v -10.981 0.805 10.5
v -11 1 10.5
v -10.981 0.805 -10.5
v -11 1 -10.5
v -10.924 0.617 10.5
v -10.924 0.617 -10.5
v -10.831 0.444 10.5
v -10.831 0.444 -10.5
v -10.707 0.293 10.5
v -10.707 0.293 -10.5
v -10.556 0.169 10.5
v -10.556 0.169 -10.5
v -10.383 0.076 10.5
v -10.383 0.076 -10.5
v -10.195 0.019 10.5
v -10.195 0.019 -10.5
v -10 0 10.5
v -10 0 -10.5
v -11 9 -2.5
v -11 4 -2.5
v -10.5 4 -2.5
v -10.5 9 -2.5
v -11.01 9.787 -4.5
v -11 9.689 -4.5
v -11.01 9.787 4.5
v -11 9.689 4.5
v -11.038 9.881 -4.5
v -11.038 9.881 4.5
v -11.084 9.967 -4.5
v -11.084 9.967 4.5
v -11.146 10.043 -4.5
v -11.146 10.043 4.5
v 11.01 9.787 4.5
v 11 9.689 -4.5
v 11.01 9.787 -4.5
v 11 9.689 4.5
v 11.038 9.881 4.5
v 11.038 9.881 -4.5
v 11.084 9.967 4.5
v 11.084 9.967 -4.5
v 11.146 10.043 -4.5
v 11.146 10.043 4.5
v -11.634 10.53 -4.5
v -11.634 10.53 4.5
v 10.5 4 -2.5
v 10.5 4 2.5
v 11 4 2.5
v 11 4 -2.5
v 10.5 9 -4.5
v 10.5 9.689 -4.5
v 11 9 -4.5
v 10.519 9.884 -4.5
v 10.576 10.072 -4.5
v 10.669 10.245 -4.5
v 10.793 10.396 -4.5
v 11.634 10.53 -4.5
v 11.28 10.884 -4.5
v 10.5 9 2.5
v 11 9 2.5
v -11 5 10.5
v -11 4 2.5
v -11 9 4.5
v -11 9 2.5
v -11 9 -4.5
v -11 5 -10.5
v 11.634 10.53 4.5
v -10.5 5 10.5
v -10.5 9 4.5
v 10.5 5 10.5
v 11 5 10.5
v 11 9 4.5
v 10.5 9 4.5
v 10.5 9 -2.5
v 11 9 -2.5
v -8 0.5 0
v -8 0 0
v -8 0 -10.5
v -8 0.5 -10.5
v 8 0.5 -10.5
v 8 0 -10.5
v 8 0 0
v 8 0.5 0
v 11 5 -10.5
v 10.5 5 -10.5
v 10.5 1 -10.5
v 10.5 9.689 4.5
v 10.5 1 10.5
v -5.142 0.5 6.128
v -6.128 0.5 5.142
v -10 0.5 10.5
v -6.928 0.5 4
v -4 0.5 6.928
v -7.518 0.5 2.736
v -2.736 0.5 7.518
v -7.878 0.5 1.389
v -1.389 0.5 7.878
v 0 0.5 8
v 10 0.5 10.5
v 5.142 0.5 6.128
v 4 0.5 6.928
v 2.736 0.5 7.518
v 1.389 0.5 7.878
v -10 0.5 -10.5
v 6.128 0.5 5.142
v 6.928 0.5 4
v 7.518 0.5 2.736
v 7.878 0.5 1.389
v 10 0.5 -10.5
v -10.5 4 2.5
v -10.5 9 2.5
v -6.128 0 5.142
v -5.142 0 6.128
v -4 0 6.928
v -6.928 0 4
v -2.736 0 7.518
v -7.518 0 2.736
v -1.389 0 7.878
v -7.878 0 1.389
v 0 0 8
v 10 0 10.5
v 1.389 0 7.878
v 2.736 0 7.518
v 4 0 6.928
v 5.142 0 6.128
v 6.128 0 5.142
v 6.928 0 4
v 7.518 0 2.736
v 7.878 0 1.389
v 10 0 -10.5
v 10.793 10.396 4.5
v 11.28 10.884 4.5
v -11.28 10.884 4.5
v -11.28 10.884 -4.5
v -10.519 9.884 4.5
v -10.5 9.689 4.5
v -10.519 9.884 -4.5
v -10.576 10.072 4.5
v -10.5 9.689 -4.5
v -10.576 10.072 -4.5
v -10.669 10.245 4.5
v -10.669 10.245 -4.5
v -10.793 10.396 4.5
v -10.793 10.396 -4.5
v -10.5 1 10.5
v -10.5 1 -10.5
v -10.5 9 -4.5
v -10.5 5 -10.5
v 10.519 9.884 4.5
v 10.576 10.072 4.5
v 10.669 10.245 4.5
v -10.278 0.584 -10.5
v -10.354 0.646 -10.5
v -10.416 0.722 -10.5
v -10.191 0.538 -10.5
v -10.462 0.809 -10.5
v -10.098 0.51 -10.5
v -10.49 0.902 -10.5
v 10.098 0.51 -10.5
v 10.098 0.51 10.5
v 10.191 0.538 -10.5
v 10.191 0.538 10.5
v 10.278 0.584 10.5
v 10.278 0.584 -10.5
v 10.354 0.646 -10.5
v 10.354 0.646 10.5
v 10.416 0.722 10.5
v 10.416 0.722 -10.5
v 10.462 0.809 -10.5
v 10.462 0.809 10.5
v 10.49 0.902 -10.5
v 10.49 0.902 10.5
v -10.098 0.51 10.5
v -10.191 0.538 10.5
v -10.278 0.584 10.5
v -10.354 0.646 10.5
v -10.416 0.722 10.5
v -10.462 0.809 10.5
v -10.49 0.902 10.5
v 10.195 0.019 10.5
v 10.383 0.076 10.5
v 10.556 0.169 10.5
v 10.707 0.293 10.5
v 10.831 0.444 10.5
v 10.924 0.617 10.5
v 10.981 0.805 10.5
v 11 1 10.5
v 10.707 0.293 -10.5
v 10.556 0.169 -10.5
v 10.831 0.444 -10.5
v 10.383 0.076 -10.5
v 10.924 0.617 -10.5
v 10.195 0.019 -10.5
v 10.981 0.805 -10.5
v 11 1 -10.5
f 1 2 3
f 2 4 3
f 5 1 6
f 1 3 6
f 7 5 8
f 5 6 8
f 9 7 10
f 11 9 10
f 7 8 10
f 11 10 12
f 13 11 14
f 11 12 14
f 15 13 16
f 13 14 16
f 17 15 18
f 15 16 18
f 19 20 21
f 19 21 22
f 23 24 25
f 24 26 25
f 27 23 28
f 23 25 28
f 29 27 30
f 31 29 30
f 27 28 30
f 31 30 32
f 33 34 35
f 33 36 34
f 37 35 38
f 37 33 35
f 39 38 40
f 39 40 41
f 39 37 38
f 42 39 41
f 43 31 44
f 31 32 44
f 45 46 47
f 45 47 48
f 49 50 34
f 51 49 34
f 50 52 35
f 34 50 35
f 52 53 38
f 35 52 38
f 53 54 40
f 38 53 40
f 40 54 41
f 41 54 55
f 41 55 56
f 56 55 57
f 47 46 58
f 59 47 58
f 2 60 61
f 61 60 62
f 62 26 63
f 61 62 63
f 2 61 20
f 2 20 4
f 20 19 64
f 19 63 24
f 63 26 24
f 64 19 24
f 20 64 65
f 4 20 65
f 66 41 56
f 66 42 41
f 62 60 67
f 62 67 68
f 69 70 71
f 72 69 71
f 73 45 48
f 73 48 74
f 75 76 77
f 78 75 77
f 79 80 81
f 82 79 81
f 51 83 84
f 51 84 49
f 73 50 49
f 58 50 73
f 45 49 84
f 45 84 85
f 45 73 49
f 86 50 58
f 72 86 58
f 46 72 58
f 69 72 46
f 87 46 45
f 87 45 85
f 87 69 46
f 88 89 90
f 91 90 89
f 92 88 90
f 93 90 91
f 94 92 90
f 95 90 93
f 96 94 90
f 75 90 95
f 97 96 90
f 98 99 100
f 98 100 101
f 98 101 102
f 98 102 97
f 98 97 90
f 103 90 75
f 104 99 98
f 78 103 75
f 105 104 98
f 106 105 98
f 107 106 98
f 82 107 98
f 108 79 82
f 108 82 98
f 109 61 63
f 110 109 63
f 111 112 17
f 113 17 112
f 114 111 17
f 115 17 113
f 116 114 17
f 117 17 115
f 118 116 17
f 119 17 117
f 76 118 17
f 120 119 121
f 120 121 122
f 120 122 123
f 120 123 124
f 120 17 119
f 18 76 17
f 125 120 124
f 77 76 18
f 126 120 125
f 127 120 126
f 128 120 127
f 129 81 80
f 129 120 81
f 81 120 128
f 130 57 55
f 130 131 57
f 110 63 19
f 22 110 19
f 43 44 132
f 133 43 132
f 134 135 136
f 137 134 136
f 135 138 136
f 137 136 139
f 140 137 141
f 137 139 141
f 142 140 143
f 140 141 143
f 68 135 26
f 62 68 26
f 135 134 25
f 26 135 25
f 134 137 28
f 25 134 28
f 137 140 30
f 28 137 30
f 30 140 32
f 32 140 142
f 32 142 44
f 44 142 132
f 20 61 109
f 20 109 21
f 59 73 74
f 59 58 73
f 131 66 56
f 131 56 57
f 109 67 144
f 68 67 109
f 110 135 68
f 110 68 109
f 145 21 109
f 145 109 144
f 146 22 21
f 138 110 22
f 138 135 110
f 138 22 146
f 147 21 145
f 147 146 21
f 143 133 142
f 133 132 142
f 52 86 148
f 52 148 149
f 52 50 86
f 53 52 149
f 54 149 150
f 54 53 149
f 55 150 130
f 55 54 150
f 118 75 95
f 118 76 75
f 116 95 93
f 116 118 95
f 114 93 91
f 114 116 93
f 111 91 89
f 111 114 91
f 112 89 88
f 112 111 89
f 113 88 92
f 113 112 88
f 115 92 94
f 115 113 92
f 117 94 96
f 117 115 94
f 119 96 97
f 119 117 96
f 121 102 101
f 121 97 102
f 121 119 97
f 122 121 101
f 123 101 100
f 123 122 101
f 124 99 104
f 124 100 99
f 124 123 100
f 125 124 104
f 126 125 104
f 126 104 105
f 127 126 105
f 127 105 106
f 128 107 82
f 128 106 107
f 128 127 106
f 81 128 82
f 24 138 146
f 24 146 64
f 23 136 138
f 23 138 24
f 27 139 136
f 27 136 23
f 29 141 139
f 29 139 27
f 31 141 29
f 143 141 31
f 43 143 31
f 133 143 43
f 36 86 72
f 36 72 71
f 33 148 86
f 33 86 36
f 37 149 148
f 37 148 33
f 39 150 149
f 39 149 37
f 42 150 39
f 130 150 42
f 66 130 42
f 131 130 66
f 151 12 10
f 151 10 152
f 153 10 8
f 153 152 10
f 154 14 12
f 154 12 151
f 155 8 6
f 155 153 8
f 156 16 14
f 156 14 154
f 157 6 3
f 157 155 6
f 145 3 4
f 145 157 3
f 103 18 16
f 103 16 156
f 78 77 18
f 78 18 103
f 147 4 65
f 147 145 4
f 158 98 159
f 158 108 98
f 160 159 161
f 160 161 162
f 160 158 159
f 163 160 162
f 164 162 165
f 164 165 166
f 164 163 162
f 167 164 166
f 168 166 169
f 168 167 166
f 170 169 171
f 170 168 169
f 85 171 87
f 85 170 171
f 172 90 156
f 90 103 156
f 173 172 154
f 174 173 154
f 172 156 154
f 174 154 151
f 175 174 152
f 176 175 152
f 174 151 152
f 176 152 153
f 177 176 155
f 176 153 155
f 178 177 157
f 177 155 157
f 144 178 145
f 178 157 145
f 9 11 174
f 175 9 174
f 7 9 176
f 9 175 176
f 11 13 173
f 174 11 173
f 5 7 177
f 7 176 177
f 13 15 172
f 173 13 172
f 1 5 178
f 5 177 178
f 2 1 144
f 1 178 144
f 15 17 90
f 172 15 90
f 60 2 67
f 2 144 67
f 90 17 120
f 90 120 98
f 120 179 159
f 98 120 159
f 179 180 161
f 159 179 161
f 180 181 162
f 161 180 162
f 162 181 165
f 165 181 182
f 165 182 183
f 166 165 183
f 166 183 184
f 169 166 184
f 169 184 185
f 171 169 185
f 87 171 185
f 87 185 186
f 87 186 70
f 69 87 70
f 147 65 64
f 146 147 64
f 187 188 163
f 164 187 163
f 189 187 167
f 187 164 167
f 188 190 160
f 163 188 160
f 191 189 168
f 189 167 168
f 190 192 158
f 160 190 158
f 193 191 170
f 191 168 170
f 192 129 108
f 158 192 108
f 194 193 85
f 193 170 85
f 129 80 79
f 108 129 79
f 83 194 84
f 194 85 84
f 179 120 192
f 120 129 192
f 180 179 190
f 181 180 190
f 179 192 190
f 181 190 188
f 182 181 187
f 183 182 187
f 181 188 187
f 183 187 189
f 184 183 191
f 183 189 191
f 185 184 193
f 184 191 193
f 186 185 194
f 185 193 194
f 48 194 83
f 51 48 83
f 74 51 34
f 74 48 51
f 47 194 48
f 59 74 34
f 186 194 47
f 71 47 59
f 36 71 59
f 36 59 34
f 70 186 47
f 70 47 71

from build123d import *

# Parameters (mm, degrees)
SKETCH2_W               = 21
SKETCH2_H               = 21
SKETCH2_R               = 8
BOSS_EXTRUDE1_DEPTH     = 0.5
CUT_EXTRUDE1_START      = -1.5
CUT_EXTRUDE1_DEPTH      = 1.5
SKETCH4_W               = 21
SKETCH4_H               = 9
BOSS_EXTRUDE2_DEPTH     = 0.5
CUT_EXTRUDE2_DEPTH      = 26.563646062
CUT_EXTRUDE2_DEPTH_BACK = 26.563646062
SKETCH5_W               = 5
SKETCH5_H               = 5
CUT_EXTRUDE3_DEPTH      = 1.5
FILLET1_R               = 1
FILLET2_R               = 0.5
EXTRUDE_THIN1_DEPTH     = 4.5
FILLET3_R               = 0.5
FILLET4_R               = 1
CUT_EXTRUDE4_DEPTH      = 27.807046038
CUT_EXTRUDE4_DEPTH_BACK = 27.807046038
SKETCH8_W               = 5
SKETCH8_H               = 5
FILLET5_R               = 0.5
FILLET6_R               = 1


with BuildPart() as part:
    # Sketch2 → Boss-Extrude1 (new body)
    with BuildSketch(Plane(origin=(0, 0, 0), x_dir=(1, 0, 0), z_dir=(0, 1, 0))):
        Rectangle(SKETCH2_W, SKETCH2_H)
        with Locations(Location((0, 0, 0), (0, 0, 270))):
            Circle(SKETCH2_R, mode=Mode.SUBTRACT)
    extrude(amount=BOSS_EXTRUDE1_DEPTH)

    # Sketch3 → Cut-Extrude1 (cut)
    with BuildSketch(Plane(origin=(0, 0.5, 0), x_dir=(1, 0, 0), z_dir=(0, 1, 0)).offset(CUT_EXTRUDE1_START)):
        with BuildLine():
            Line((-8, 0), (-8, 10.5))
            Line((-8, 10.5), (-8, 11.595978523))
            Line((-8, 11.595978523), (8, 11.595978523))
            Line((8, 11.595978523), (8, 0))
            ThreePointArc((8, 0), (0, -8), (-8, 0))
        make_face()
    extrude(amount=CUT_EXTRUDE1_DEPTH, mode=Mode.SUBTRACT)

    # Sketch4 → Boss-Extrude2 (add)
    with BuildSketch(Plane(origin=(10.5, 0, 0), x_dir=(0, 0, -1), z_dir=(1, 0, 0))):
        with Locations((0, 4.5)):
            Rectangle(SKETCH4_W, SKETCH4_H)
    boss_extrude2 = extrude(amount=BOSS_EXTRUDE2_DEPTH)

    # Sketch5 → Cut-Extrude2 (cut, two sides: drawn at the far end of the back side and taken through both)
    with BuildSketch(Plane(origin=(11, 0, 0), x_dir=(0, 0, -1), z_dir=(1, 0, 0)).offset(-CUT_EXTRUDE2_DEPTH_BACK)):
        with Locations((0, 6.5)):
            Rectangle(SKETCH5_W, SKETCH5_H)
    extrude(amount=CUT_EXTRUDE2_DEPTH + CUT_EXTRUDE2_DEPTH_BACK, mode=Mode.SUBTRACT)

    # Sketch6 → Cut-Extrude3 (cut)
    with BuildSketch(Plane(origin=(11, 0, 0), x_dir=(0, 0, -1), z_dir=(1, 0, 0))):
        Polygon((10.5, 5), (4.5, 9), (4.5, 12.483472669), (11.734785125, 12.483472669), (11.734785125, 5), align=None)
    cut_extrude3 = extrude(amount=-CUT_EXTRUDE3_DEPTH, mode=Mode.SUBTRACT)

    # Mirror1: Cut-Extrude3 across plane
    add(cut_extrude3.mirror(Plane.XY), mode=Mode.SUBTRACT)

    # Fillet1
    fillet1_edges = [part.edges().sort_by_distance(p)[0] for p in [
        (11, 0, 0),
    ]]
    fillet(fillet1_edges, radius=FILLET1_R)

    # Fillet2
    fillet2_edges = [part.edges().sort_by_distance(p)[0] for p in [
        (10.5, 0.5, 0),
    ]]
    fillet(fillet2_edges, radius=FILLET2_R)

    # Sketch7 → Extrude-Thin1 (add, symmetric)
    with BuildSketch(Plane.XY):
        Polygon((11, 9), (11, 9.896446609), (11.633883476, 10.530330086), (11.280330086, 10.883883476), (10.5, 10.103553391), (10.5, 9), align=None)
    extrude_thin1 = extrude(amount=EXTRUDE_THIN1_DEPTH, both=True)

    # Fillet3
    fillet3_edges = [part.edges().sort_by_distance(p)[0] for p in [
        (11, 9.896446609, 0),
    ]]
    fillet(fillet3_edges, radius=FILLET3_R)

    # Fillet4
    fillet4_edges = [part.edges().sort_by_distance(p)[0] for p in [
        (10.5, 10.103553391, 0),
    ]]
    fillet(fillet4_edges, radius=FILLET4_R)

    # Mirror2: Boss-Extrude2, Extrude-Thin1 across plane
    add(boss_extrude2.mirror(Plane(origin=(0, 0, 0), x_dir=(0, 0, 1), z_dir=(1, 0, 0))))
    add(extrude_thin1.mirror(Plane(origin=(0, 0, 0), x_dir=(0, 0, 1), z_dir=(1, 0, 0))))

    # Sketch8 → Cut-Extrude4 (cut, two sides: drawn at the far end of the back side and taken through both)
    with BuildSketch(Plane(origin=(-10.5, 0, 0), x_dir=(0, 0, -1), z_dir=(1, 0, 0)).offset(-CUT_EXTRUDE4_DEPTH_BACK)):
        Polygon((4.5, 9), (4.5, 13.510449082), (11.904854474, 13.510449082), (11.904854474, 4.985722932), (10.5, 5), align=None)
        with Locations((0, 6.5)):
            Rectangle(SKETCH8_W, SKETCH8_H)
        Polygon((-10.5, 5), (-4.5, 9), (-4.5, 13.510449082), (-11.904854474, 13.510449082), (-11.904854474, 4.985722932), align=None)
    extrude(amount=CUT_EXTRUDE4_DEPTH + CUT_EXTRUDE4_DEPTH_BACK, mode=Mode.SUBTRACT)

    # Fillet5
    fillet5_edges = [part.edges().sort_by_distance(p)[0] for p in [
        (-10.5, 0.5, 0),
        (-11, 9.896446609, 0),
    ]]
    fillet(fillet5_edges, radius=FILLET5_R)

    # Fillet6
    fillet6_edges = [part.edges().sort_by_distance(p)[0] for p in [
        (-11, 0, 0),
        (-10.5, 10.103553391, 0),
    ]]
    fillet(fillet6_edges, radius=FILLET6_R)


solid = part.part
